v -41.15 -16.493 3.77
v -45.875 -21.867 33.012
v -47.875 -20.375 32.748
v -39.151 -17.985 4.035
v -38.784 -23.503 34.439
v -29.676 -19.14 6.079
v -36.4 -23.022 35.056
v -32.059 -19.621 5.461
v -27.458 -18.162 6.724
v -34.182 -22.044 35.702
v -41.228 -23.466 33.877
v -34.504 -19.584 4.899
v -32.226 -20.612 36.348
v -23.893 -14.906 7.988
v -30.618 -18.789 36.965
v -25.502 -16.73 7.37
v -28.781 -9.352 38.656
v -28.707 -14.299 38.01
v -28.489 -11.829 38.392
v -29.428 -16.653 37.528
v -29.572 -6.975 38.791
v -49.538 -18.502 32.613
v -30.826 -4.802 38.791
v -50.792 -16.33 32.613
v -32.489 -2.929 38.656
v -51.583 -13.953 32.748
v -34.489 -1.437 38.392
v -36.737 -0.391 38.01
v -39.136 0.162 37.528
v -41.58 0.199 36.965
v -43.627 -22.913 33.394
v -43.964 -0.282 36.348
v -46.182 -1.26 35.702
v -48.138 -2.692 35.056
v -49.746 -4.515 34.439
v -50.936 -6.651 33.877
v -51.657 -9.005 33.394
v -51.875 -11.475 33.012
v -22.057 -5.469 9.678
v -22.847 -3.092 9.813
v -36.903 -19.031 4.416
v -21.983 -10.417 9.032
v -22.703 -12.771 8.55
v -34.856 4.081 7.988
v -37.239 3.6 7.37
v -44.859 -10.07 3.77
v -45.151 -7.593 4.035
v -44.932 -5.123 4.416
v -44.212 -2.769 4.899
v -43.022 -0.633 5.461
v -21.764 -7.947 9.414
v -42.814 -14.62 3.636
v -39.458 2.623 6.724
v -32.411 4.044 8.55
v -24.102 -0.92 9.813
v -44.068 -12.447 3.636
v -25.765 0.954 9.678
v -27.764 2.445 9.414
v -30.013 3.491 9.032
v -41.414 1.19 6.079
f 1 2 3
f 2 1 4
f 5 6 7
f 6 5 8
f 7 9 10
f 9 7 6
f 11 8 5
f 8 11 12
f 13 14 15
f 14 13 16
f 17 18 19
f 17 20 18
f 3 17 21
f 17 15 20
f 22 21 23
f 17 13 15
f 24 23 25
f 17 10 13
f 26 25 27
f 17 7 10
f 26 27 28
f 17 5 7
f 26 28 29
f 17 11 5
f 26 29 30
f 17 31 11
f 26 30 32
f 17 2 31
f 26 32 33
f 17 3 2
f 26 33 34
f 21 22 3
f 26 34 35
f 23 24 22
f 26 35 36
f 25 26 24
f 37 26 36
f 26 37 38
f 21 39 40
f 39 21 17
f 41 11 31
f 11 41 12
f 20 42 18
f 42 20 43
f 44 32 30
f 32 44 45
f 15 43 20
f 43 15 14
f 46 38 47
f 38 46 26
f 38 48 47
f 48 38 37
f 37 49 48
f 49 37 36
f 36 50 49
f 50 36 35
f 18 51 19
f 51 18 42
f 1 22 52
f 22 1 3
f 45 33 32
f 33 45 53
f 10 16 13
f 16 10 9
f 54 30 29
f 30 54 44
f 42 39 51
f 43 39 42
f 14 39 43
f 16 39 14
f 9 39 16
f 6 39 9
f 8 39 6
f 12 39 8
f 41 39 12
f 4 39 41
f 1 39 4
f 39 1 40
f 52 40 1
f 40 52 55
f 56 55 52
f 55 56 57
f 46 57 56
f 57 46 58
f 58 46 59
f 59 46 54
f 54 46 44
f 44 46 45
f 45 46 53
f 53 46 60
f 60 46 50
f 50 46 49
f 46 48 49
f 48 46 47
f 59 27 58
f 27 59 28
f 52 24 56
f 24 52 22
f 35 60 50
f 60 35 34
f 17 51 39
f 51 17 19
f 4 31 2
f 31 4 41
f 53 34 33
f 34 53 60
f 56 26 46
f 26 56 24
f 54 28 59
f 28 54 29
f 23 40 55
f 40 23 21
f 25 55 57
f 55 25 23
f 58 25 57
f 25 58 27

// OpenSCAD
// Generated by generate_scads.py
rotate([15,180,120]) {
  translate([-10,30,-30]) {
    union() {
      cylinder(h=30, r=12, center=true);
      sphere(r=8);
    }
  }
}
